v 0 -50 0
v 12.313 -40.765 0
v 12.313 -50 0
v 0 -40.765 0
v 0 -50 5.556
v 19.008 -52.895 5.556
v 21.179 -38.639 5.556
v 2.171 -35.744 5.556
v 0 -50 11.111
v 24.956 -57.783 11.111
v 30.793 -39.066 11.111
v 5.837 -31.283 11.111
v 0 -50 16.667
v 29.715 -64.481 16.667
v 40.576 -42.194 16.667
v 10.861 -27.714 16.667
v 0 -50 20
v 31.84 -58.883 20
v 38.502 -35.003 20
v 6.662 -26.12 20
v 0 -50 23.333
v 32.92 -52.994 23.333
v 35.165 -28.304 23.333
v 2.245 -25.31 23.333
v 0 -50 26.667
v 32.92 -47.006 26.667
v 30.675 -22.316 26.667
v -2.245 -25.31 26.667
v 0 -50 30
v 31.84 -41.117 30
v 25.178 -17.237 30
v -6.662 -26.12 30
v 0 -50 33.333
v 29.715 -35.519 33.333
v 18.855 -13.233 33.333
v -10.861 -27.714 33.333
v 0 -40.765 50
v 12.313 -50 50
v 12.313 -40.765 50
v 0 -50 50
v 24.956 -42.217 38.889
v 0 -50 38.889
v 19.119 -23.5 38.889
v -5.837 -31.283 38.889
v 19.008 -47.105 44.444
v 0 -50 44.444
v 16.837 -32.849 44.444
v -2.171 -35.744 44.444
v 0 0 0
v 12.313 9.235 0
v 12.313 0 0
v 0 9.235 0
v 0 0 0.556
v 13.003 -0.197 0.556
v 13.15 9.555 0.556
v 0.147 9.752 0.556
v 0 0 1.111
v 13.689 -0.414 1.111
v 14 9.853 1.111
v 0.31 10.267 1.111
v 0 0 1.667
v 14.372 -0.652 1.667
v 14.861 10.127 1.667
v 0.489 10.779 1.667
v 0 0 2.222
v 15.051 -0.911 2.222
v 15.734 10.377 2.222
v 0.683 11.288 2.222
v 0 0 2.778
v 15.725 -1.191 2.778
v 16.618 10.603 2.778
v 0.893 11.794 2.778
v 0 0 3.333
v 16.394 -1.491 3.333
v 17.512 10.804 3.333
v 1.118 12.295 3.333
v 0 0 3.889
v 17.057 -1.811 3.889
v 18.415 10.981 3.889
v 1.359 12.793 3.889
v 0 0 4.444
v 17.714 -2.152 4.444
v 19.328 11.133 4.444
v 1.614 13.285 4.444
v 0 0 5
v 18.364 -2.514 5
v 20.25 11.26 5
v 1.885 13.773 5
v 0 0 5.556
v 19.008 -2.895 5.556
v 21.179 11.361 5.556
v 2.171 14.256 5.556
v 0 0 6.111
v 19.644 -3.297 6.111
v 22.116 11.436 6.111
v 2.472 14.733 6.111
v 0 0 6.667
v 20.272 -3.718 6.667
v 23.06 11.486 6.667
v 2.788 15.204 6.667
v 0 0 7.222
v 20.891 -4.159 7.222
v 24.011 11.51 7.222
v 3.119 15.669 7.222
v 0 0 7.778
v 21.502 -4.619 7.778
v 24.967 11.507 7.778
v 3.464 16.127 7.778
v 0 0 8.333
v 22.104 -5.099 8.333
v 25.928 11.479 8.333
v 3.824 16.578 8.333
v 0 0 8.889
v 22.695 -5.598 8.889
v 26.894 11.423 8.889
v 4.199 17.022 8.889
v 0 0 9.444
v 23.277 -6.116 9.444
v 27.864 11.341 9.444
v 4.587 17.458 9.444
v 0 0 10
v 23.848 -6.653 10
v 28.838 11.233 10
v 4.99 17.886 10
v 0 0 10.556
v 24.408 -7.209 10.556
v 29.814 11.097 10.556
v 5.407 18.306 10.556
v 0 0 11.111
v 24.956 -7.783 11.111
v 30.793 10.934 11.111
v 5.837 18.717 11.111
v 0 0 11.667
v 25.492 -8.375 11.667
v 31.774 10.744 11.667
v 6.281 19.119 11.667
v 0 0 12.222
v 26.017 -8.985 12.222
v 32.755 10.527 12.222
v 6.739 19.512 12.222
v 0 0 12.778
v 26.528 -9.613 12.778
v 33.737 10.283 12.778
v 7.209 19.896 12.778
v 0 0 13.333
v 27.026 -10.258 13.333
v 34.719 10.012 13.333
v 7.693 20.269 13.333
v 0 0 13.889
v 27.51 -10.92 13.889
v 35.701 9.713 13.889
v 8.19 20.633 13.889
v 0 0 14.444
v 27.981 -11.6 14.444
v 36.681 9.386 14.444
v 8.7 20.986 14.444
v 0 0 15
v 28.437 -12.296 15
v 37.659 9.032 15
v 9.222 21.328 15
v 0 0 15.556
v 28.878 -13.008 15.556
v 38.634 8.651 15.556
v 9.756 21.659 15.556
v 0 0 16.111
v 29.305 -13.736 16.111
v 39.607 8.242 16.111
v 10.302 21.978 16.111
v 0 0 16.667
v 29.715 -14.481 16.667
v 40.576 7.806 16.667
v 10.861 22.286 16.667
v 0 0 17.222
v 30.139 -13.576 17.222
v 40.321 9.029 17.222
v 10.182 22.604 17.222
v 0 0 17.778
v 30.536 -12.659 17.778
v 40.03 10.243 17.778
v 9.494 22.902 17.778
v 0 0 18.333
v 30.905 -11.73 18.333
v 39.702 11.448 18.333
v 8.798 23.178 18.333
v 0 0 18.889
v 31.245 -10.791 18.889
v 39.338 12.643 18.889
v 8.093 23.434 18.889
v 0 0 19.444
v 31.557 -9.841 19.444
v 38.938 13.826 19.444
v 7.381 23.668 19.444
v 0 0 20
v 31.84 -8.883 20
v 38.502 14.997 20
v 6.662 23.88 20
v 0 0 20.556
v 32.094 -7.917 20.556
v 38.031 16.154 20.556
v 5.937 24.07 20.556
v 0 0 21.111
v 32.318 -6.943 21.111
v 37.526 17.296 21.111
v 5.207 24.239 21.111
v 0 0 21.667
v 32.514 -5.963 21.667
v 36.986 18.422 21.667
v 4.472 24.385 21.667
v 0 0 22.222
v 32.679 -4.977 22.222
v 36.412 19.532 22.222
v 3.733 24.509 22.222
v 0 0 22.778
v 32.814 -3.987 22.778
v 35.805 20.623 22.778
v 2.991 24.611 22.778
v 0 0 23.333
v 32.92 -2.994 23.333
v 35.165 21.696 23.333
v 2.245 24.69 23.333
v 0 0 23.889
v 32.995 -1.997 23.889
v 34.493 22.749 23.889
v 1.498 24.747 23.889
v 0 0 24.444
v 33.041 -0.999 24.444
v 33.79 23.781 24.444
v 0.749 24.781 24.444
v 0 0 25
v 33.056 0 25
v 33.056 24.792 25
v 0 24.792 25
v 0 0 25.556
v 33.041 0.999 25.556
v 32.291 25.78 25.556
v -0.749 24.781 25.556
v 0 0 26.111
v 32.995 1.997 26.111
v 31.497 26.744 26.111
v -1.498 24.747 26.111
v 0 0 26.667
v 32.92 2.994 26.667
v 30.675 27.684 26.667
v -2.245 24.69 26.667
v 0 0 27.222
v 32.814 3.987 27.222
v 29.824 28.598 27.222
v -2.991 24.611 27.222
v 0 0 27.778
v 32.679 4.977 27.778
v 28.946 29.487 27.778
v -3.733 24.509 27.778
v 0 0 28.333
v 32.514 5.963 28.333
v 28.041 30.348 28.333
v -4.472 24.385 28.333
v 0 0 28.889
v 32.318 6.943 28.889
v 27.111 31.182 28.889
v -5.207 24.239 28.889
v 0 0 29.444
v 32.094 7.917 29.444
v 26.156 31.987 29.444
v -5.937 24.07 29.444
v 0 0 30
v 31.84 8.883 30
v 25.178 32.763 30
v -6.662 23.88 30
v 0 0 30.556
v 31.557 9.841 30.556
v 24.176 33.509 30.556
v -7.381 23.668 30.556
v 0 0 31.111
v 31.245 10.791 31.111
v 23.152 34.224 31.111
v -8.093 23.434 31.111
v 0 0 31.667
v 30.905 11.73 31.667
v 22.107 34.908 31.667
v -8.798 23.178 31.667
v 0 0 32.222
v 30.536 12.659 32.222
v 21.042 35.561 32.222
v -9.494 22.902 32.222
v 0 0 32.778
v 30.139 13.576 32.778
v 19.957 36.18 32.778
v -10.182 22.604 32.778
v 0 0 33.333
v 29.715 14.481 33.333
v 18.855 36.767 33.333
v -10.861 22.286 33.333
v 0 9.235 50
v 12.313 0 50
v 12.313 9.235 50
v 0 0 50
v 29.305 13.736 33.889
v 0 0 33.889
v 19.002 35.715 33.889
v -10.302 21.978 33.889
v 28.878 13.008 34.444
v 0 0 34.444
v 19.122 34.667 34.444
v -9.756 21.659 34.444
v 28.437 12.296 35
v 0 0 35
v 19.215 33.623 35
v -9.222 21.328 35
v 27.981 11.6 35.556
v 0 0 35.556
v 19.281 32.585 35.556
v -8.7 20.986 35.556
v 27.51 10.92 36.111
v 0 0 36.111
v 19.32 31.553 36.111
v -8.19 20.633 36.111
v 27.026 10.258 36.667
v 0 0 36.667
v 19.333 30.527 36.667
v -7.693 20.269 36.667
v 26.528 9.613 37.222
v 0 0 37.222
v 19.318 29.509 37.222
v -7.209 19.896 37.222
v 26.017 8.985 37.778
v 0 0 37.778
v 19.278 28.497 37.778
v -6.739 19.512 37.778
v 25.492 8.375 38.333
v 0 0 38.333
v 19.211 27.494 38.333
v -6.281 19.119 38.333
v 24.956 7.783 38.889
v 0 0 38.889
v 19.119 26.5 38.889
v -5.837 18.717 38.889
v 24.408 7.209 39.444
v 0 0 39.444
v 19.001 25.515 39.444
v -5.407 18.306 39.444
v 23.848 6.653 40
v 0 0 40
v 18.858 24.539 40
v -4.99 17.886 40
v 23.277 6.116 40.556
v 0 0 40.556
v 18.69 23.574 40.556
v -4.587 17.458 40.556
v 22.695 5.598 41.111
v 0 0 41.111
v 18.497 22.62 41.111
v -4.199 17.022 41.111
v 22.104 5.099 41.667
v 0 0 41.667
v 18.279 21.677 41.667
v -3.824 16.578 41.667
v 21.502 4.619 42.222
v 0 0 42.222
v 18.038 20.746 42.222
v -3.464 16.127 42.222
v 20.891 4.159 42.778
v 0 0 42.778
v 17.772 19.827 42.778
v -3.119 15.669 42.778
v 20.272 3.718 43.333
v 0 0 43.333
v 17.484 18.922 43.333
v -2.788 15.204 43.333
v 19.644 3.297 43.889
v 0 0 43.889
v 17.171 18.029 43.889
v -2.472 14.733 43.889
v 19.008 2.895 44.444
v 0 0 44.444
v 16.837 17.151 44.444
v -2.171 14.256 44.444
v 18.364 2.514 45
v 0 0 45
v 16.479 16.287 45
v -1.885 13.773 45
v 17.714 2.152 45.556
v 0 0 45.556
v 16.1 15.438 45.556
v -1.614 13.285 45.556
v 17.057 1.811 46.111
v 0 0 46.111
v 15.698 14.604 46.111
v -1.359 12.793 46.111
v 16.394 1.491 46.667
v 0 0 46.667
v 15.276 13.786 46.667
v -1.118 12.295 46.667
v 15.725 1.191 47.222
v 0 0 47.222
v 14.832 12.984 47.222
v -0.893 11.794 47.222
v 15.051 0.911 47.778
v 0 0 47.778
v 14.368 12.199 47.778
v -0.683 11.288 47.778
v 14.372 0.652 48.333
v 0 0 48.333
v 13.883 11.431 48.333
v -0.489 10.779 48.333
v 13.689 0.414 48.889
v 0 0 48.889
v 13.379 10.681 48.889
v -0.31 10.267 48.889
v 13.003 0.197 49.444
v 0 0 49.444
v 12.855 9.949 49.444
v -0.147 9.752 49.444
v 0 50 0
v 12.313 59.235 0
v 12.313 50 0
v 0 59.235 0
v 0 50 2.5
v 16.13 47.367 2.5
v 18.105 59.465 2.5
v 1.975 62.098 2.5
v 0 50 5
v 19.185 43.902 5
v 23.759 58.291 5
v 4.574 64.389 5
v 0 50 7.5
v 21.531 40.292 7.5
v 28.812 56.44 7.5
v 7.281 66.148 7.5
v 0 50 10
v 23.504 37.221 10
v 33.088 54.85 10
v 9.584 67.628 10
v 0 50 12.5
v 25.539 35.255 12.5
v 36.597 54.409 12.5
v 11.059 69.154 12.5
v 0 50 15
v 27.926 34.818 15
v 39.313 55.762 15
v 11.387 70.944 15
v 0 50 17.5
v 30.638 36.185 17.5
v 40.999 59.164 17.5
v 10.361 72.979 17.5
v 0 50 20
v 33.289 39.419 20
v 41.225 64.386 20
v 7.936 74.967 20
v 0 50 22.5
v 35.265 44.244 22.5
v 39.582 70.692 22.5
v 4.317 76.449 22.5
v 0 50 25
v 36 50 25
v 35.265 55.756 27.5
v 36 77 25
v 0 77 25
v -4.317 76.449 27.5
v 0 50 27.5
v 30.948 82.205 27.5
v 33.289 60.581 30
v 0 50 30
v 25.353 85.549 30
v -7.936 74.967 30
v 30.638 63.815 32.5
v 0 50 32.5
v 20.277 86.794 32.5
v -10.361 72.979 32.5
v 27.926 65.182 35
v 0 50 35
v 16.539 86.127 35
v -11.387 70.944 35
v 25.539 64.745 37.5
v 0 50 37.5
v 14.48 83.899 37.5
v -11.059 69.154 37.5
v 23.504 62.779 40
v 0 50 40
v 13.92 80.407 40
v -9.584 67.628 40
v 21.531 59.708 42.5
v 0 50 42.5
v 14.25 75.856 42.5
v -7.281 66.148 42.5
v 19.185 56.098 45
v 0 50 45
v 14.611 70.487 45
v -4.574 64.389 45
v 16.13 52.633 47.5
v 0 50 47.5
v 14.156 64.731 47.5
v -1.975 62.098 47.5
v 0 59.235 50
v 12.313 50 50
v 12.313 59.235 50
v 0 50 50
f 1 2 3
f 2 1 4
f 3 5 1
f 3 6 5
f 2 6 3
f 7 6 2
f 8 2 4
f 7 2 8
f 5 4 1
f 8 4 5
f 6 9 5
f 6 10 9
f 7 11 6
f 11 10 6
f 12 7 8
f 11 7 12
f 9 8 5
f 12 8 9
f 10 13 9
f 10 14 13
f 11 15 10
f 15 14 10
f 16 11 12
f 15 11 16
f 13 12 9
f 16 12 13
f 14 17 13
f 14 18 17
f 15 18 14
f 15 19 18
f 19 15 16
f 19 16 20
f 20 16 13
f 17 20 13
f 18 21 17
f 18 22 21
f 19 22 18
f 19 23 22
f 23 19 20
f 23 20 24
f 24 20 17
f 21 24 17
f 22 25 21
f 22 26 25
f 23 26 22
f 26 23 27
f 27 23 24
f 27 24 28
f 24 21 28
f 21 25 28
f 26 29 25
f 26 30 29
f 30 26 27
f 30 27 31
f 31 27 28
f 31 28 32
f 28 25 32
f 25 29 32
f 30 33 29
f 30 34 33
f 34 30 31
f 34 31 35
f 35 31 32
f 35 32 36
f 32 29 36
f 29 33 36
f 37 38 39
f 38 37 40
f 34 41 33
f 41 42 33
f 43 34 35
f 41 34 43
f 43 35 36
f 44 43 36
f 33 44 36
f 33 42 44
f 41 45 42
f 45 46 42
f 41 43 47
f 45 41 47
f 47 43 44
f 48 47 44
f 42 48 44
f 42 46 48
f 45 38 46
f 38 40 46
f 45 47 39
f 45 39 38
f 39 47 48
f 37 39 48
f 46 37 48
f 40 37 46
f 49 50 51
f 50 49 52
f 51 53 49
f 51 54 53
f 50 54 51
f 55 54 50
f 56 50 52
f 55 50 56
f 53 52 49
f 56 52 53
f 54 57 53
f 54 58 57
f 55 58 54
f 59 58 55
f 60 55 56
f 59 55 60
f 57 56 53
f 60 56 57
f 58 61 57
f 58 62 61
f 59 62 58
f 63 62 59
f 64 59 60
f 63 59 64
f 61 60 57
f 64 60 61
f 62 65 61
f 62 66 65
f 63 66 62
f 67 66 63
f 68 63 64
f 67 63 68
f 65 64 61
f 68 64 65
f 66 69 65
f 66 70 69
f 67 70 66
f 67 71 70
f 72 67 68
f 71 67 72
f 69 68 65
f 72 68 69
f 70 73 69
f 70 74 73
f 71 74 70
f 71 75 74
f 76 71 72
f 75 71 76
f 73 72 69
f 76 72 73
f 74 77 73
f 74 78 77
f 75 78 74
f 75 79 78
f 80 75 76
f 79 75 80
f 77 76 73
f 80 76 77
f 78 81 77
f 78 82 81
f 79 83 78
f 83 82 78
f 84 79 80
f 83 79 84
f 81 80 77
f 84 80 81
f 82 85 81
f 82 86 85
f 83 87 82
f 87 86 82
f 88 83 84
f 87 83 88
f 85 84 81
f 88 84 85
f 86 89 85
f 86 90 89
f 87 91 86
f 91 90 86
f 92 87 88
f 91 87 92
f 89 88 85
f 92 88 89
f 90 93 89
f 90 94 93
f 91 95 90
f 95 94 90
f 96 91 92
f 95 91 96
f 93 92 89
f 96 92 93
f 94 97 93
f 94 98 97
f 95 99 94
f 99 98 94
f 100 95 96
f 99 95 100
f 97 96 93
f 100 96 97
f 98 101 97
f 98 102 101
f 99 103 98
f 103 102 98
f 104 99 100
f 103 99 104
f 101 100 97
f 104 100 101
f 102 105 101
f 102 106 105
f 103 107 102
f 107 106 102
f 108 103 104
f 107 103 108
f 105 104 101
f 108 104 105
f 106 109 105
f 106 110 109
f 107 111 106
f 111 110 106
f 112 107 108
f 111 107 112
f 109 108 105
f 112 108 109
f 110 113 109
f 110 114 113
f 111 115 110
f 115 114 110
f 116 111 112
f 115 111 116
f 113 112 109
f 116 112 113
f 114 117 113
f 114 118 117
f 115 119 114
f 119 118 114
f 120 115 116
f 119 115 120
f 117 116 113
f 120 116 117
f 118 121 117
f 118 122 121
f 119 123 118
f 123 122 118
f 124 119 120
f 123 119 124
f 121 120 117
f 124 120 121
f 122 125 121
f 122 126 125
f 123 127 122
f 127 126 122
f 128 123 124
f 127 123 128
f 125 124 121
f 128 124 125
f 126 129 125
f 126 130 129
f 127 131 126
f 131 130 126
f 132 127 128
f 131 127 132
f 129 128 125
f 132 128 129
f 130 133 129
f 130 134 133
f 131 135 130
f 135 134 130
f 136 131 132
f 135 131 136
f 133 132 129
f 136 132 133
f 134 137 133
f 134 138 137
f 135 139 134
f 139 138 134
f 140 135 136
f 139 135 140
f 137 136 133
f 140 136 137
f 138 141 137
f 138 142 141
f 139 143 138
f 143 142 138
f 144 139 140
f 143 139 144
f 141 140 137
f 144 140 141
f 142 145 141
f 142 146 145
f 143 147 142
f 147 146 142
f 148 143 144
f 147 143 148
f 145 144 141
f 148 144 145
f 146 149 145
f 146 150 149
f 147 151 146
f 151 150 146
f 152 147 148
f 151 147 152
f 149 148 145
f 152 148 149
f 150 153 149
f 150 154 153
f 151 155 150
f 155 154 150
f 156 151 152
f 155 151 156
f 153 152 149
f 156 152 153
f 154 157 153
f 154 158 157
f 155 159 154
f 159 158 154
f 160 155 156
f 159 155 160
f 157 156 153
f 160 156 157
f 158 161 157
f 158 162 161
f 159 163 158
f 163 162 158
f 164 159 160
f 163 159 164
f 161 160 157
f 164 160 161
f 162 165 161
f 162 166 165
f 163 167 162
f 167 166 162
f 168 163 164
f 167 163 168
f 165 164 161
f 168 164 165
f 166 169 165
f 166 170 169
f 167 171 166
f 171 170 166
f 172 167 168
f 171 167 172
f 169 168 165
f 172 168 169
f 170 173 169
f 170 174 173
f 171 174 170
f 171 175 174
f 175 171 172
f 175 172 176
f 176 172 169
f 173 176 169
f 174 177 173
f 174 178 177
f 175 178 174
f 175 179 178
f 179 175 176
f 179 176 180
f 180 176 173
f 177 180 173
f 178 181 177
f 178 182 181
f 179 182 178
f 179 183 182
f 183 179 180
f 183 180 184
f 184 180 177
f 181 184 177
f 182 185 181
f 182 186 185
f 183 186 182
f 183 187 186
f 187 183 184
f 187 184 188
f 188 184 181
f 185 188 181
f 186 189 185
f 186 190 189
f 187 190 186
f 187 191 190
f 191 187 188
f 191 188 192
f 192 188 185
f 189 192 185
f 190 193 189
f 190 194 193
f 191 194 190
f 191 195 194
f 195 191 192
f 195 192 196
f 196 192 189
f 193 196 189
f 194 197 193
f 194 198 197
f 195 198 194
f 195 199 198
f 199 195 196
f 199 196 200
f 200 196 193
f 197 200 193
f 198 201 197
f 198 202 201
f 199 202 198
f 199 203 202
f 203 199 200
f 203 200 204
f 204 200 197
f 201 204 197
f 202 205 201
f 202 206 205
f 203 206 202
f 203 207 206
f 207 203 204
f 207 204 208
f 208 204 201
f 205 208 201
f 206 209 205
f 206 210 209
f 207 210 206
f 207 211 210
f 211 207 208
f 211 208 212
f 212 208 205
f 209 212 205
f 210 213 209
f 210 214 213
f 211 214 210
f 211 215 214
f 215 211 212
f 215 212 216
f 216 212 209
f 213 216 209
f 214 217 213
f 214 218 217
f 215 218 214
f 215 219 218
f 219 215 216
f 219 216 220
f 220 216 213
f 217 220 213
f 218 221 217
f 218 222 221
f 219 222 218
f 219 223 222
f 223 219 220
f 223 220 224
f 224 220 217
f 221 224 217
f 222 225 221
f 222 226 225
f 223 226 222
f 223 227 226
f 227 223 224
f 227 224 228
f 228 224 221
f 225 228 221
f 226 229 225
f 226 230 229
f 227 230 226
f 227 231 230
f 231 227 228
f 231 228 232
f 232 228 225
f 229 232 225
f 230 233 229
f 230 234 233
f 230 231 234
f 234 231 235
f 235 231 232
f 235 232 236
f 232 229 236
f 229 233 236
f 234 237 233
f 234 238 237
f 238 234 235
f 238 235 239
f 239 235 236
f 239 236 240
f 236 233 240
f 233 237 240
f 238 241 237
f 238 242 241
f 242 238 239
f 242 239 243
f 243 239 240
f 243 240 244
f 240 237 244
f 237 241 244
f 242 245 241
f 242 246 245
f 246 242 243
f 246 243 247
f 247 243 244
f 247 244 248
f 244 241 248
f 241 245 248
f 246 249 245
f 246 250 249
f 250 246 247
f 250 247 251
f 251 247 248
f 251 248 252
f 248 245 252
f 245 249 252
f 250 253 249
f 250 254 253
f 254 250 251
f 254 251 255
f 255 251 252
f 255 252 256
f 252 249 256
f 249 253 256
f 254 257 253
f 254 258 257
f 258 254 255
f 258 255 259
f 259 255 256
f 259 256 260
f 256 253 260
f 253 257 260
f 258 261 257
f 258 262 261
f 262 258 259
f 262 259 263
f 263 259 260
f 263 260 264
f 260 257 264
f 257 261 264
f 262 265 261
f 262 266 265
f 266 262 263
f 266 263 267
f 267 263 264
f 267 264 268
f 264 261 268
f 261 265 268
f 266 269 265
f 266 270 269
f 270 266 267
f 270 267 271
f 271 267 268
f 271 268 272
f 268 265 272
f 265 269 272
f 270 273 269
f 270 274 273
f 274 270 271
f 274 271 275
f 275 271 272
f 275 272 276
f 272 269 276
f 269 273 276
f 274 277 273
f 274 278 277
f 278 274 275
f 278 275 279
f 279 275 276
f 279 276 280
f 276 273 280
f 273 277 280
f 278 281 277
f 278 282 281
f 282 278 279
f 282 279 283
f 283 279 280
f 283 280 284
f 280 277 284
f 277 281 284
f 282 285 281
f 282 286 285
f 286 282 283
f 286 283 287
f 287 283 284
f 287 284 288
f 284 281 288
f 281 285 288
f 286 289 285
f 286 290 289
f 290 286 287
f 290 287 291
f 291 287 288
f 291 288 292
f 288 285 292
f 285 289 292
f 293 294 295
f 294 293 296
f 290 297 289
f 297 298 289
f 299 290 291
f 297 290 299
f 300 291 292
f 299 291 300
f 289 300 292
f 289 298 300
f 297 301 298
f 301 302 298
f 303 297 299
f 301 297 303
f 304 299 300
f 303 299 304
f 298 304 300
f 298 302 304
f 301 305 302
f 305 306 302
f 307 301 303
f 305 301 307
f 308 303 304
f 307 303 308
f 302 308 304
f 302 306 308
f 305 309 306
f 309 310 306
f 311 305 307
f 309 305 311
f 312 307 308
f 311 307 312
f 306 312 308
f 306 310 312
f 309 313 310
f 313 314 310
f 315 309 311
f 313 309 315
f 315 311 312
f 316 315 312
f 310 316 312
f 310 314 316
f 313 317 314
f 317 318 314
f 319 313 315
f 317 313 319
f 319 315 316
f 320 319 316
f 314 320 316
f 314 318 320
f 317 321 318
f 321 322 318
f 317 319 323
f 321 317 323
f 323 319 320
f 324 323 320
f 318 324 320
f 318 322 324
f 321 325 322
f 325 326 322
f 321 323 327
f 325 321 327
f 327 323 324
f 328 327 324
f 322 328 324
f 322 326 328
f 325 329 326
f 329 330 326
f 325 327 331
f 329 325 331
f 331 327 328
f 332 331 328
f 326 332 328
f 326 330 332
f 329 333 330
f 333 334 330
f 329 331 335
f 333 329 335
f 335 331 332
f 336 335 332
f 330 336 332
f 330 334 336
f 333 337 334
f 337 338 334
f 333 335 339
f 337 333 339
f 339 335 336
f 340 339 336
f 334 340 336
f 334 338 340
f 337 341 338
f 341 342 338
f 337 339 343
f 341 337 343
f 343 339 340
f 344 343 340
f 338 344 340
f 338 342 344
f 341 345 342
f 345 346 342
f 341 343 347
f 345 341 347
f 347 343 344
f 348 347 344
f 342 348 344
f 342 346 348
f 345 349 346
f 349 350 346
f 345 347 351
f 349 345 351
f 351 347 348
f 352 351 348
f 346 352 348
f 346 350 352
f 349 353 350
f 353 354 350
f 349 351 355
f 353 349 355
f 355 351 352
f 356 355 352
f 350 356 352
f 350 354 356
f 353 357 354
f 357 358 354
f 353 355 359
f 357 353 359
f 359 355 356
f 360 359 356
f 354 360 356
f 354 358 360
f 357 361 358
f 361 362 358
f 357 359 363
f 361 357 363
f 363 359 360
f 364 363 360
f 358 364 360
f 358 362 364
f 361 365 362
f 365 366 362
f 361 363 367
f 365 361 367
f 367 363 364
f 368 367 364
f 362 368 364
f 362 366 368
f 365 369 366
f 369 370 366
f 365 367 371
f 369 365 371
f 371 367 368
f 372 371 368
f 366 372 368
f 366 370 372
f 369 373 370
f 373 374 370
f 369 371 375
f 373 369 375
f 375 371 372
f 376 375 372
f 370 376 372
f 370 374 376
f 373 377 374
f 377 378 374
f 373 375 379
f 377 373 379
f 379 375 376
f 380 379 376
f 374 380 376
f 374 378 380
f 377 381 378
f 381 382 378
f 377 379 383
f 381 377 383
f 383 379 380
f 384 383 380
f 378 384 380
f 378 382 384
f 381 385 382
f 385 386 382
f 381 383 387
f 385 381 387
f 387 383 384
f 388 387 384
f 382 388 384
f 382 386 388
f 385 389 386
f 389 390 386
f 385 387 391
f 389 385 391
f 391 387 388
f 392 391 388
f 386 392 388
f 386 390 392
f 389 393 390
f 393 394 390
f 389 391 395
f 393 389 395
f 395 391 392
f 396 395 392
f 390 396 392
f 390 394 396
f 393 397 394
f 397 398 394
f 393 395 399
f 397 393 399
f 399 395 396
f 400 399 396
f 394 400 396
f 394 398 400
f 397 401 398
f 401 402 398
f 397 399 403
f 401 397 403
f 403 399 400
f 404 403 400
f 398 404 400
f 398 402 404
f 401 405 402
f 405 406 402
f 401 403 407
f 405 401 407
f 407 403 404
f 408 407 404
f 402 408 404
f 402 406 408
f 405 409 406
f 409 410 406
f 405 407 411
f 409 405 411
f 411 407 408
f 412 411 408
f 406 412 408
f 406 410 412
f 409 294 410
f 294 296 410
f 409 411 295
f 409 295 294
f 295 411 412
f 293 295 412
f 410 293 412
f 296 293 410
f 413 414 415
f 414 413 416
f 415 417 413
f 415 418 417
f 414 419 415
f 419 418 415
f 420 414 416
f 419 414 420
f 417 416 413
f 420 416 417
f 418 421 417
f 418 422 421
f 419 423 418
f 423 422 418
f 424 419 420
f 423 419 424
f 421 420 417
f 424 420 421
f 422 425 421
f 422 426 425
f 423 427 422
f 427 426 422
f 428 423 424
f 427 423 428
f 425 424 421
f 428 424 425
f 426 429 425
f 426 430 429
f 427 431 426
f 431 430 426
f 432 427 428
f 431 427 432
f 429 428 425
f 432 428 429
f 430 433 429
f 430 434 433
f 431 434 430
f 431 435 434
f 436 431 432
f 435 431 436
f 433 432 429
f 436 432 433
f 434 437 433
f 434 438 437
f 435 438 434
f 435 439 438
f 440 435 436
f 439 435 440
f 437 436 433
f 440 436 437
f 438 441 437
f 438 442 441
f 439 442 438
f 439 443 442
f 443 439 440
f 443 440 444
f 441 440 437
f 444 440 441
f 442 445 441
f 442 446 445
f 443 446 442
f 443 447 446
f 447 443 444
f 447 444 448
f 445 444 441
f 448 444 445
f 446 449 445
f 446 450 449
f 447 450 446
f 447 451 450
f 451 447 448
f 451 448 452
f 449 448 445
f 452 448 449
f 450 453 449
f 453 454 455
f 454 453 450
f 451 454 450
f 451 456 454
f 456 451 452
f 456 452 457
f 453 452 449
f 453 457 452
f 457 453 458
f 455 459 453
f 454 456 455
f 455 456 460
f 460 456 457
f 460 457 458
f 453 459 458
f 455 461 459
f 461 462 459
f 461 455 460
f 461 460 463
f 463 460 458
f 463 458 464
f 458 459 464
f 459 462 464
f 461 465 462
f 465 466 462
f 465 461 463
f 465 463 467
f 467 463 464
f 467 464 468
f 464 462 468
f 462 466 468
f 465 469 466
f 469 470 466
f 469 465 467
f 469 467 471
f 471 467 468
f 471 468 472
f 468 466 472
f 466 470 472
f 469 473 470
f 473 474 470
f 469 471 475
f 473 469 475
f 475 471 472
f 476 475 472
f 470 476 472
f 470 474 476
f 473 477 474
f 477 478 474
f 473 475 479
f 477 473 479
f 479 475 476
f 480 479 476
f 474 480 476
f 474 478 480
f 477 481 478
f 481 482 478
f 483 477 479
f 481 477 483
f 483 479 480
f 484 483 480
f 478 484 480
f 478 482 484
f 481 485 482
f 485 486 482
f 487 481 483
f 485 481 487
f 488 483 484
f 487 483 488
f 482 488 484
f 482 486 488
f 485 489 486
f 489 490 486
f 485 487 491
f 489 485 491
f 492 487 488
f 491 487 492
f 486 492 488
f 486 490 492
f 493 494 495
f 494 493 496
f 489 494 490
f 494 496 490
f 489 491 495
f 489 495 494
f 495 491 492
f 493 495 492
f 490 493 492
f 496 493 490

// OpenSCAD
//Linear Extrude with Twist and Scale as interpolated functions
// The local function definitions need to point to valid functions
// Otherwise, this module does not need to be modified,  
//  - unless default parameters want to be changed 
//  - or additional parameters want to be forwarded
module linear_extrude_ftfs(height=1,isteps=20,slices=0){
    //local function definitions for twist and scale, respectively
    function ftw(x) = leftfs_ftw(x);  //<--- !! User Defined Twist
    function fsc(x) = leftfs_fsc(x);  //<--- !! User Defined Scale
    //union of piecewise generated extrudes
    union(){  
      for(i=[0:1:isteps-1]){
        translate([0,0,i*height/isteps])
          linear_extrude(
            height=height/isteps
            ,twist=ftw((i+1)/isteps)-ftw(i/isteps)
            ,scale=fsc((i+1)/isteps)/fsc(i/isteps)
            ,slices=slices
          )
            rotate([0,0,-ftw(i/isteps)])
              scale(fsc(i/isteps))
                children();
      }
    }
}
// Example function defines the scale function
// Function name defined in module local function definition
function leftfs_fsc(x)=
    let(scale=3,span=140,start=20)
    scale*sin(x*span+start);
// Example function defines the twist function
// Function name defined in module local function definition
function leftfs_ftw(x)=
    let(twist=30,span=360,start=0)
    twist*sin(x*span+start);


//Left rendered object demonstrating the steps effect
translate([0,-50,0])
  linear_extrude_ftfs(height=50,isteps=3)
    square([12,9]);

//Center rendered object demonstrating the slices effect
translate([0,0,0])
  linear_extrude_ftfs(height=50,isteps=3,slices=30)
    square([12,9]);

//Right rendered object with default parameters
translate([0,50,0])
  linear_extrude_ftfs(height=50)
    square([12,9]);
